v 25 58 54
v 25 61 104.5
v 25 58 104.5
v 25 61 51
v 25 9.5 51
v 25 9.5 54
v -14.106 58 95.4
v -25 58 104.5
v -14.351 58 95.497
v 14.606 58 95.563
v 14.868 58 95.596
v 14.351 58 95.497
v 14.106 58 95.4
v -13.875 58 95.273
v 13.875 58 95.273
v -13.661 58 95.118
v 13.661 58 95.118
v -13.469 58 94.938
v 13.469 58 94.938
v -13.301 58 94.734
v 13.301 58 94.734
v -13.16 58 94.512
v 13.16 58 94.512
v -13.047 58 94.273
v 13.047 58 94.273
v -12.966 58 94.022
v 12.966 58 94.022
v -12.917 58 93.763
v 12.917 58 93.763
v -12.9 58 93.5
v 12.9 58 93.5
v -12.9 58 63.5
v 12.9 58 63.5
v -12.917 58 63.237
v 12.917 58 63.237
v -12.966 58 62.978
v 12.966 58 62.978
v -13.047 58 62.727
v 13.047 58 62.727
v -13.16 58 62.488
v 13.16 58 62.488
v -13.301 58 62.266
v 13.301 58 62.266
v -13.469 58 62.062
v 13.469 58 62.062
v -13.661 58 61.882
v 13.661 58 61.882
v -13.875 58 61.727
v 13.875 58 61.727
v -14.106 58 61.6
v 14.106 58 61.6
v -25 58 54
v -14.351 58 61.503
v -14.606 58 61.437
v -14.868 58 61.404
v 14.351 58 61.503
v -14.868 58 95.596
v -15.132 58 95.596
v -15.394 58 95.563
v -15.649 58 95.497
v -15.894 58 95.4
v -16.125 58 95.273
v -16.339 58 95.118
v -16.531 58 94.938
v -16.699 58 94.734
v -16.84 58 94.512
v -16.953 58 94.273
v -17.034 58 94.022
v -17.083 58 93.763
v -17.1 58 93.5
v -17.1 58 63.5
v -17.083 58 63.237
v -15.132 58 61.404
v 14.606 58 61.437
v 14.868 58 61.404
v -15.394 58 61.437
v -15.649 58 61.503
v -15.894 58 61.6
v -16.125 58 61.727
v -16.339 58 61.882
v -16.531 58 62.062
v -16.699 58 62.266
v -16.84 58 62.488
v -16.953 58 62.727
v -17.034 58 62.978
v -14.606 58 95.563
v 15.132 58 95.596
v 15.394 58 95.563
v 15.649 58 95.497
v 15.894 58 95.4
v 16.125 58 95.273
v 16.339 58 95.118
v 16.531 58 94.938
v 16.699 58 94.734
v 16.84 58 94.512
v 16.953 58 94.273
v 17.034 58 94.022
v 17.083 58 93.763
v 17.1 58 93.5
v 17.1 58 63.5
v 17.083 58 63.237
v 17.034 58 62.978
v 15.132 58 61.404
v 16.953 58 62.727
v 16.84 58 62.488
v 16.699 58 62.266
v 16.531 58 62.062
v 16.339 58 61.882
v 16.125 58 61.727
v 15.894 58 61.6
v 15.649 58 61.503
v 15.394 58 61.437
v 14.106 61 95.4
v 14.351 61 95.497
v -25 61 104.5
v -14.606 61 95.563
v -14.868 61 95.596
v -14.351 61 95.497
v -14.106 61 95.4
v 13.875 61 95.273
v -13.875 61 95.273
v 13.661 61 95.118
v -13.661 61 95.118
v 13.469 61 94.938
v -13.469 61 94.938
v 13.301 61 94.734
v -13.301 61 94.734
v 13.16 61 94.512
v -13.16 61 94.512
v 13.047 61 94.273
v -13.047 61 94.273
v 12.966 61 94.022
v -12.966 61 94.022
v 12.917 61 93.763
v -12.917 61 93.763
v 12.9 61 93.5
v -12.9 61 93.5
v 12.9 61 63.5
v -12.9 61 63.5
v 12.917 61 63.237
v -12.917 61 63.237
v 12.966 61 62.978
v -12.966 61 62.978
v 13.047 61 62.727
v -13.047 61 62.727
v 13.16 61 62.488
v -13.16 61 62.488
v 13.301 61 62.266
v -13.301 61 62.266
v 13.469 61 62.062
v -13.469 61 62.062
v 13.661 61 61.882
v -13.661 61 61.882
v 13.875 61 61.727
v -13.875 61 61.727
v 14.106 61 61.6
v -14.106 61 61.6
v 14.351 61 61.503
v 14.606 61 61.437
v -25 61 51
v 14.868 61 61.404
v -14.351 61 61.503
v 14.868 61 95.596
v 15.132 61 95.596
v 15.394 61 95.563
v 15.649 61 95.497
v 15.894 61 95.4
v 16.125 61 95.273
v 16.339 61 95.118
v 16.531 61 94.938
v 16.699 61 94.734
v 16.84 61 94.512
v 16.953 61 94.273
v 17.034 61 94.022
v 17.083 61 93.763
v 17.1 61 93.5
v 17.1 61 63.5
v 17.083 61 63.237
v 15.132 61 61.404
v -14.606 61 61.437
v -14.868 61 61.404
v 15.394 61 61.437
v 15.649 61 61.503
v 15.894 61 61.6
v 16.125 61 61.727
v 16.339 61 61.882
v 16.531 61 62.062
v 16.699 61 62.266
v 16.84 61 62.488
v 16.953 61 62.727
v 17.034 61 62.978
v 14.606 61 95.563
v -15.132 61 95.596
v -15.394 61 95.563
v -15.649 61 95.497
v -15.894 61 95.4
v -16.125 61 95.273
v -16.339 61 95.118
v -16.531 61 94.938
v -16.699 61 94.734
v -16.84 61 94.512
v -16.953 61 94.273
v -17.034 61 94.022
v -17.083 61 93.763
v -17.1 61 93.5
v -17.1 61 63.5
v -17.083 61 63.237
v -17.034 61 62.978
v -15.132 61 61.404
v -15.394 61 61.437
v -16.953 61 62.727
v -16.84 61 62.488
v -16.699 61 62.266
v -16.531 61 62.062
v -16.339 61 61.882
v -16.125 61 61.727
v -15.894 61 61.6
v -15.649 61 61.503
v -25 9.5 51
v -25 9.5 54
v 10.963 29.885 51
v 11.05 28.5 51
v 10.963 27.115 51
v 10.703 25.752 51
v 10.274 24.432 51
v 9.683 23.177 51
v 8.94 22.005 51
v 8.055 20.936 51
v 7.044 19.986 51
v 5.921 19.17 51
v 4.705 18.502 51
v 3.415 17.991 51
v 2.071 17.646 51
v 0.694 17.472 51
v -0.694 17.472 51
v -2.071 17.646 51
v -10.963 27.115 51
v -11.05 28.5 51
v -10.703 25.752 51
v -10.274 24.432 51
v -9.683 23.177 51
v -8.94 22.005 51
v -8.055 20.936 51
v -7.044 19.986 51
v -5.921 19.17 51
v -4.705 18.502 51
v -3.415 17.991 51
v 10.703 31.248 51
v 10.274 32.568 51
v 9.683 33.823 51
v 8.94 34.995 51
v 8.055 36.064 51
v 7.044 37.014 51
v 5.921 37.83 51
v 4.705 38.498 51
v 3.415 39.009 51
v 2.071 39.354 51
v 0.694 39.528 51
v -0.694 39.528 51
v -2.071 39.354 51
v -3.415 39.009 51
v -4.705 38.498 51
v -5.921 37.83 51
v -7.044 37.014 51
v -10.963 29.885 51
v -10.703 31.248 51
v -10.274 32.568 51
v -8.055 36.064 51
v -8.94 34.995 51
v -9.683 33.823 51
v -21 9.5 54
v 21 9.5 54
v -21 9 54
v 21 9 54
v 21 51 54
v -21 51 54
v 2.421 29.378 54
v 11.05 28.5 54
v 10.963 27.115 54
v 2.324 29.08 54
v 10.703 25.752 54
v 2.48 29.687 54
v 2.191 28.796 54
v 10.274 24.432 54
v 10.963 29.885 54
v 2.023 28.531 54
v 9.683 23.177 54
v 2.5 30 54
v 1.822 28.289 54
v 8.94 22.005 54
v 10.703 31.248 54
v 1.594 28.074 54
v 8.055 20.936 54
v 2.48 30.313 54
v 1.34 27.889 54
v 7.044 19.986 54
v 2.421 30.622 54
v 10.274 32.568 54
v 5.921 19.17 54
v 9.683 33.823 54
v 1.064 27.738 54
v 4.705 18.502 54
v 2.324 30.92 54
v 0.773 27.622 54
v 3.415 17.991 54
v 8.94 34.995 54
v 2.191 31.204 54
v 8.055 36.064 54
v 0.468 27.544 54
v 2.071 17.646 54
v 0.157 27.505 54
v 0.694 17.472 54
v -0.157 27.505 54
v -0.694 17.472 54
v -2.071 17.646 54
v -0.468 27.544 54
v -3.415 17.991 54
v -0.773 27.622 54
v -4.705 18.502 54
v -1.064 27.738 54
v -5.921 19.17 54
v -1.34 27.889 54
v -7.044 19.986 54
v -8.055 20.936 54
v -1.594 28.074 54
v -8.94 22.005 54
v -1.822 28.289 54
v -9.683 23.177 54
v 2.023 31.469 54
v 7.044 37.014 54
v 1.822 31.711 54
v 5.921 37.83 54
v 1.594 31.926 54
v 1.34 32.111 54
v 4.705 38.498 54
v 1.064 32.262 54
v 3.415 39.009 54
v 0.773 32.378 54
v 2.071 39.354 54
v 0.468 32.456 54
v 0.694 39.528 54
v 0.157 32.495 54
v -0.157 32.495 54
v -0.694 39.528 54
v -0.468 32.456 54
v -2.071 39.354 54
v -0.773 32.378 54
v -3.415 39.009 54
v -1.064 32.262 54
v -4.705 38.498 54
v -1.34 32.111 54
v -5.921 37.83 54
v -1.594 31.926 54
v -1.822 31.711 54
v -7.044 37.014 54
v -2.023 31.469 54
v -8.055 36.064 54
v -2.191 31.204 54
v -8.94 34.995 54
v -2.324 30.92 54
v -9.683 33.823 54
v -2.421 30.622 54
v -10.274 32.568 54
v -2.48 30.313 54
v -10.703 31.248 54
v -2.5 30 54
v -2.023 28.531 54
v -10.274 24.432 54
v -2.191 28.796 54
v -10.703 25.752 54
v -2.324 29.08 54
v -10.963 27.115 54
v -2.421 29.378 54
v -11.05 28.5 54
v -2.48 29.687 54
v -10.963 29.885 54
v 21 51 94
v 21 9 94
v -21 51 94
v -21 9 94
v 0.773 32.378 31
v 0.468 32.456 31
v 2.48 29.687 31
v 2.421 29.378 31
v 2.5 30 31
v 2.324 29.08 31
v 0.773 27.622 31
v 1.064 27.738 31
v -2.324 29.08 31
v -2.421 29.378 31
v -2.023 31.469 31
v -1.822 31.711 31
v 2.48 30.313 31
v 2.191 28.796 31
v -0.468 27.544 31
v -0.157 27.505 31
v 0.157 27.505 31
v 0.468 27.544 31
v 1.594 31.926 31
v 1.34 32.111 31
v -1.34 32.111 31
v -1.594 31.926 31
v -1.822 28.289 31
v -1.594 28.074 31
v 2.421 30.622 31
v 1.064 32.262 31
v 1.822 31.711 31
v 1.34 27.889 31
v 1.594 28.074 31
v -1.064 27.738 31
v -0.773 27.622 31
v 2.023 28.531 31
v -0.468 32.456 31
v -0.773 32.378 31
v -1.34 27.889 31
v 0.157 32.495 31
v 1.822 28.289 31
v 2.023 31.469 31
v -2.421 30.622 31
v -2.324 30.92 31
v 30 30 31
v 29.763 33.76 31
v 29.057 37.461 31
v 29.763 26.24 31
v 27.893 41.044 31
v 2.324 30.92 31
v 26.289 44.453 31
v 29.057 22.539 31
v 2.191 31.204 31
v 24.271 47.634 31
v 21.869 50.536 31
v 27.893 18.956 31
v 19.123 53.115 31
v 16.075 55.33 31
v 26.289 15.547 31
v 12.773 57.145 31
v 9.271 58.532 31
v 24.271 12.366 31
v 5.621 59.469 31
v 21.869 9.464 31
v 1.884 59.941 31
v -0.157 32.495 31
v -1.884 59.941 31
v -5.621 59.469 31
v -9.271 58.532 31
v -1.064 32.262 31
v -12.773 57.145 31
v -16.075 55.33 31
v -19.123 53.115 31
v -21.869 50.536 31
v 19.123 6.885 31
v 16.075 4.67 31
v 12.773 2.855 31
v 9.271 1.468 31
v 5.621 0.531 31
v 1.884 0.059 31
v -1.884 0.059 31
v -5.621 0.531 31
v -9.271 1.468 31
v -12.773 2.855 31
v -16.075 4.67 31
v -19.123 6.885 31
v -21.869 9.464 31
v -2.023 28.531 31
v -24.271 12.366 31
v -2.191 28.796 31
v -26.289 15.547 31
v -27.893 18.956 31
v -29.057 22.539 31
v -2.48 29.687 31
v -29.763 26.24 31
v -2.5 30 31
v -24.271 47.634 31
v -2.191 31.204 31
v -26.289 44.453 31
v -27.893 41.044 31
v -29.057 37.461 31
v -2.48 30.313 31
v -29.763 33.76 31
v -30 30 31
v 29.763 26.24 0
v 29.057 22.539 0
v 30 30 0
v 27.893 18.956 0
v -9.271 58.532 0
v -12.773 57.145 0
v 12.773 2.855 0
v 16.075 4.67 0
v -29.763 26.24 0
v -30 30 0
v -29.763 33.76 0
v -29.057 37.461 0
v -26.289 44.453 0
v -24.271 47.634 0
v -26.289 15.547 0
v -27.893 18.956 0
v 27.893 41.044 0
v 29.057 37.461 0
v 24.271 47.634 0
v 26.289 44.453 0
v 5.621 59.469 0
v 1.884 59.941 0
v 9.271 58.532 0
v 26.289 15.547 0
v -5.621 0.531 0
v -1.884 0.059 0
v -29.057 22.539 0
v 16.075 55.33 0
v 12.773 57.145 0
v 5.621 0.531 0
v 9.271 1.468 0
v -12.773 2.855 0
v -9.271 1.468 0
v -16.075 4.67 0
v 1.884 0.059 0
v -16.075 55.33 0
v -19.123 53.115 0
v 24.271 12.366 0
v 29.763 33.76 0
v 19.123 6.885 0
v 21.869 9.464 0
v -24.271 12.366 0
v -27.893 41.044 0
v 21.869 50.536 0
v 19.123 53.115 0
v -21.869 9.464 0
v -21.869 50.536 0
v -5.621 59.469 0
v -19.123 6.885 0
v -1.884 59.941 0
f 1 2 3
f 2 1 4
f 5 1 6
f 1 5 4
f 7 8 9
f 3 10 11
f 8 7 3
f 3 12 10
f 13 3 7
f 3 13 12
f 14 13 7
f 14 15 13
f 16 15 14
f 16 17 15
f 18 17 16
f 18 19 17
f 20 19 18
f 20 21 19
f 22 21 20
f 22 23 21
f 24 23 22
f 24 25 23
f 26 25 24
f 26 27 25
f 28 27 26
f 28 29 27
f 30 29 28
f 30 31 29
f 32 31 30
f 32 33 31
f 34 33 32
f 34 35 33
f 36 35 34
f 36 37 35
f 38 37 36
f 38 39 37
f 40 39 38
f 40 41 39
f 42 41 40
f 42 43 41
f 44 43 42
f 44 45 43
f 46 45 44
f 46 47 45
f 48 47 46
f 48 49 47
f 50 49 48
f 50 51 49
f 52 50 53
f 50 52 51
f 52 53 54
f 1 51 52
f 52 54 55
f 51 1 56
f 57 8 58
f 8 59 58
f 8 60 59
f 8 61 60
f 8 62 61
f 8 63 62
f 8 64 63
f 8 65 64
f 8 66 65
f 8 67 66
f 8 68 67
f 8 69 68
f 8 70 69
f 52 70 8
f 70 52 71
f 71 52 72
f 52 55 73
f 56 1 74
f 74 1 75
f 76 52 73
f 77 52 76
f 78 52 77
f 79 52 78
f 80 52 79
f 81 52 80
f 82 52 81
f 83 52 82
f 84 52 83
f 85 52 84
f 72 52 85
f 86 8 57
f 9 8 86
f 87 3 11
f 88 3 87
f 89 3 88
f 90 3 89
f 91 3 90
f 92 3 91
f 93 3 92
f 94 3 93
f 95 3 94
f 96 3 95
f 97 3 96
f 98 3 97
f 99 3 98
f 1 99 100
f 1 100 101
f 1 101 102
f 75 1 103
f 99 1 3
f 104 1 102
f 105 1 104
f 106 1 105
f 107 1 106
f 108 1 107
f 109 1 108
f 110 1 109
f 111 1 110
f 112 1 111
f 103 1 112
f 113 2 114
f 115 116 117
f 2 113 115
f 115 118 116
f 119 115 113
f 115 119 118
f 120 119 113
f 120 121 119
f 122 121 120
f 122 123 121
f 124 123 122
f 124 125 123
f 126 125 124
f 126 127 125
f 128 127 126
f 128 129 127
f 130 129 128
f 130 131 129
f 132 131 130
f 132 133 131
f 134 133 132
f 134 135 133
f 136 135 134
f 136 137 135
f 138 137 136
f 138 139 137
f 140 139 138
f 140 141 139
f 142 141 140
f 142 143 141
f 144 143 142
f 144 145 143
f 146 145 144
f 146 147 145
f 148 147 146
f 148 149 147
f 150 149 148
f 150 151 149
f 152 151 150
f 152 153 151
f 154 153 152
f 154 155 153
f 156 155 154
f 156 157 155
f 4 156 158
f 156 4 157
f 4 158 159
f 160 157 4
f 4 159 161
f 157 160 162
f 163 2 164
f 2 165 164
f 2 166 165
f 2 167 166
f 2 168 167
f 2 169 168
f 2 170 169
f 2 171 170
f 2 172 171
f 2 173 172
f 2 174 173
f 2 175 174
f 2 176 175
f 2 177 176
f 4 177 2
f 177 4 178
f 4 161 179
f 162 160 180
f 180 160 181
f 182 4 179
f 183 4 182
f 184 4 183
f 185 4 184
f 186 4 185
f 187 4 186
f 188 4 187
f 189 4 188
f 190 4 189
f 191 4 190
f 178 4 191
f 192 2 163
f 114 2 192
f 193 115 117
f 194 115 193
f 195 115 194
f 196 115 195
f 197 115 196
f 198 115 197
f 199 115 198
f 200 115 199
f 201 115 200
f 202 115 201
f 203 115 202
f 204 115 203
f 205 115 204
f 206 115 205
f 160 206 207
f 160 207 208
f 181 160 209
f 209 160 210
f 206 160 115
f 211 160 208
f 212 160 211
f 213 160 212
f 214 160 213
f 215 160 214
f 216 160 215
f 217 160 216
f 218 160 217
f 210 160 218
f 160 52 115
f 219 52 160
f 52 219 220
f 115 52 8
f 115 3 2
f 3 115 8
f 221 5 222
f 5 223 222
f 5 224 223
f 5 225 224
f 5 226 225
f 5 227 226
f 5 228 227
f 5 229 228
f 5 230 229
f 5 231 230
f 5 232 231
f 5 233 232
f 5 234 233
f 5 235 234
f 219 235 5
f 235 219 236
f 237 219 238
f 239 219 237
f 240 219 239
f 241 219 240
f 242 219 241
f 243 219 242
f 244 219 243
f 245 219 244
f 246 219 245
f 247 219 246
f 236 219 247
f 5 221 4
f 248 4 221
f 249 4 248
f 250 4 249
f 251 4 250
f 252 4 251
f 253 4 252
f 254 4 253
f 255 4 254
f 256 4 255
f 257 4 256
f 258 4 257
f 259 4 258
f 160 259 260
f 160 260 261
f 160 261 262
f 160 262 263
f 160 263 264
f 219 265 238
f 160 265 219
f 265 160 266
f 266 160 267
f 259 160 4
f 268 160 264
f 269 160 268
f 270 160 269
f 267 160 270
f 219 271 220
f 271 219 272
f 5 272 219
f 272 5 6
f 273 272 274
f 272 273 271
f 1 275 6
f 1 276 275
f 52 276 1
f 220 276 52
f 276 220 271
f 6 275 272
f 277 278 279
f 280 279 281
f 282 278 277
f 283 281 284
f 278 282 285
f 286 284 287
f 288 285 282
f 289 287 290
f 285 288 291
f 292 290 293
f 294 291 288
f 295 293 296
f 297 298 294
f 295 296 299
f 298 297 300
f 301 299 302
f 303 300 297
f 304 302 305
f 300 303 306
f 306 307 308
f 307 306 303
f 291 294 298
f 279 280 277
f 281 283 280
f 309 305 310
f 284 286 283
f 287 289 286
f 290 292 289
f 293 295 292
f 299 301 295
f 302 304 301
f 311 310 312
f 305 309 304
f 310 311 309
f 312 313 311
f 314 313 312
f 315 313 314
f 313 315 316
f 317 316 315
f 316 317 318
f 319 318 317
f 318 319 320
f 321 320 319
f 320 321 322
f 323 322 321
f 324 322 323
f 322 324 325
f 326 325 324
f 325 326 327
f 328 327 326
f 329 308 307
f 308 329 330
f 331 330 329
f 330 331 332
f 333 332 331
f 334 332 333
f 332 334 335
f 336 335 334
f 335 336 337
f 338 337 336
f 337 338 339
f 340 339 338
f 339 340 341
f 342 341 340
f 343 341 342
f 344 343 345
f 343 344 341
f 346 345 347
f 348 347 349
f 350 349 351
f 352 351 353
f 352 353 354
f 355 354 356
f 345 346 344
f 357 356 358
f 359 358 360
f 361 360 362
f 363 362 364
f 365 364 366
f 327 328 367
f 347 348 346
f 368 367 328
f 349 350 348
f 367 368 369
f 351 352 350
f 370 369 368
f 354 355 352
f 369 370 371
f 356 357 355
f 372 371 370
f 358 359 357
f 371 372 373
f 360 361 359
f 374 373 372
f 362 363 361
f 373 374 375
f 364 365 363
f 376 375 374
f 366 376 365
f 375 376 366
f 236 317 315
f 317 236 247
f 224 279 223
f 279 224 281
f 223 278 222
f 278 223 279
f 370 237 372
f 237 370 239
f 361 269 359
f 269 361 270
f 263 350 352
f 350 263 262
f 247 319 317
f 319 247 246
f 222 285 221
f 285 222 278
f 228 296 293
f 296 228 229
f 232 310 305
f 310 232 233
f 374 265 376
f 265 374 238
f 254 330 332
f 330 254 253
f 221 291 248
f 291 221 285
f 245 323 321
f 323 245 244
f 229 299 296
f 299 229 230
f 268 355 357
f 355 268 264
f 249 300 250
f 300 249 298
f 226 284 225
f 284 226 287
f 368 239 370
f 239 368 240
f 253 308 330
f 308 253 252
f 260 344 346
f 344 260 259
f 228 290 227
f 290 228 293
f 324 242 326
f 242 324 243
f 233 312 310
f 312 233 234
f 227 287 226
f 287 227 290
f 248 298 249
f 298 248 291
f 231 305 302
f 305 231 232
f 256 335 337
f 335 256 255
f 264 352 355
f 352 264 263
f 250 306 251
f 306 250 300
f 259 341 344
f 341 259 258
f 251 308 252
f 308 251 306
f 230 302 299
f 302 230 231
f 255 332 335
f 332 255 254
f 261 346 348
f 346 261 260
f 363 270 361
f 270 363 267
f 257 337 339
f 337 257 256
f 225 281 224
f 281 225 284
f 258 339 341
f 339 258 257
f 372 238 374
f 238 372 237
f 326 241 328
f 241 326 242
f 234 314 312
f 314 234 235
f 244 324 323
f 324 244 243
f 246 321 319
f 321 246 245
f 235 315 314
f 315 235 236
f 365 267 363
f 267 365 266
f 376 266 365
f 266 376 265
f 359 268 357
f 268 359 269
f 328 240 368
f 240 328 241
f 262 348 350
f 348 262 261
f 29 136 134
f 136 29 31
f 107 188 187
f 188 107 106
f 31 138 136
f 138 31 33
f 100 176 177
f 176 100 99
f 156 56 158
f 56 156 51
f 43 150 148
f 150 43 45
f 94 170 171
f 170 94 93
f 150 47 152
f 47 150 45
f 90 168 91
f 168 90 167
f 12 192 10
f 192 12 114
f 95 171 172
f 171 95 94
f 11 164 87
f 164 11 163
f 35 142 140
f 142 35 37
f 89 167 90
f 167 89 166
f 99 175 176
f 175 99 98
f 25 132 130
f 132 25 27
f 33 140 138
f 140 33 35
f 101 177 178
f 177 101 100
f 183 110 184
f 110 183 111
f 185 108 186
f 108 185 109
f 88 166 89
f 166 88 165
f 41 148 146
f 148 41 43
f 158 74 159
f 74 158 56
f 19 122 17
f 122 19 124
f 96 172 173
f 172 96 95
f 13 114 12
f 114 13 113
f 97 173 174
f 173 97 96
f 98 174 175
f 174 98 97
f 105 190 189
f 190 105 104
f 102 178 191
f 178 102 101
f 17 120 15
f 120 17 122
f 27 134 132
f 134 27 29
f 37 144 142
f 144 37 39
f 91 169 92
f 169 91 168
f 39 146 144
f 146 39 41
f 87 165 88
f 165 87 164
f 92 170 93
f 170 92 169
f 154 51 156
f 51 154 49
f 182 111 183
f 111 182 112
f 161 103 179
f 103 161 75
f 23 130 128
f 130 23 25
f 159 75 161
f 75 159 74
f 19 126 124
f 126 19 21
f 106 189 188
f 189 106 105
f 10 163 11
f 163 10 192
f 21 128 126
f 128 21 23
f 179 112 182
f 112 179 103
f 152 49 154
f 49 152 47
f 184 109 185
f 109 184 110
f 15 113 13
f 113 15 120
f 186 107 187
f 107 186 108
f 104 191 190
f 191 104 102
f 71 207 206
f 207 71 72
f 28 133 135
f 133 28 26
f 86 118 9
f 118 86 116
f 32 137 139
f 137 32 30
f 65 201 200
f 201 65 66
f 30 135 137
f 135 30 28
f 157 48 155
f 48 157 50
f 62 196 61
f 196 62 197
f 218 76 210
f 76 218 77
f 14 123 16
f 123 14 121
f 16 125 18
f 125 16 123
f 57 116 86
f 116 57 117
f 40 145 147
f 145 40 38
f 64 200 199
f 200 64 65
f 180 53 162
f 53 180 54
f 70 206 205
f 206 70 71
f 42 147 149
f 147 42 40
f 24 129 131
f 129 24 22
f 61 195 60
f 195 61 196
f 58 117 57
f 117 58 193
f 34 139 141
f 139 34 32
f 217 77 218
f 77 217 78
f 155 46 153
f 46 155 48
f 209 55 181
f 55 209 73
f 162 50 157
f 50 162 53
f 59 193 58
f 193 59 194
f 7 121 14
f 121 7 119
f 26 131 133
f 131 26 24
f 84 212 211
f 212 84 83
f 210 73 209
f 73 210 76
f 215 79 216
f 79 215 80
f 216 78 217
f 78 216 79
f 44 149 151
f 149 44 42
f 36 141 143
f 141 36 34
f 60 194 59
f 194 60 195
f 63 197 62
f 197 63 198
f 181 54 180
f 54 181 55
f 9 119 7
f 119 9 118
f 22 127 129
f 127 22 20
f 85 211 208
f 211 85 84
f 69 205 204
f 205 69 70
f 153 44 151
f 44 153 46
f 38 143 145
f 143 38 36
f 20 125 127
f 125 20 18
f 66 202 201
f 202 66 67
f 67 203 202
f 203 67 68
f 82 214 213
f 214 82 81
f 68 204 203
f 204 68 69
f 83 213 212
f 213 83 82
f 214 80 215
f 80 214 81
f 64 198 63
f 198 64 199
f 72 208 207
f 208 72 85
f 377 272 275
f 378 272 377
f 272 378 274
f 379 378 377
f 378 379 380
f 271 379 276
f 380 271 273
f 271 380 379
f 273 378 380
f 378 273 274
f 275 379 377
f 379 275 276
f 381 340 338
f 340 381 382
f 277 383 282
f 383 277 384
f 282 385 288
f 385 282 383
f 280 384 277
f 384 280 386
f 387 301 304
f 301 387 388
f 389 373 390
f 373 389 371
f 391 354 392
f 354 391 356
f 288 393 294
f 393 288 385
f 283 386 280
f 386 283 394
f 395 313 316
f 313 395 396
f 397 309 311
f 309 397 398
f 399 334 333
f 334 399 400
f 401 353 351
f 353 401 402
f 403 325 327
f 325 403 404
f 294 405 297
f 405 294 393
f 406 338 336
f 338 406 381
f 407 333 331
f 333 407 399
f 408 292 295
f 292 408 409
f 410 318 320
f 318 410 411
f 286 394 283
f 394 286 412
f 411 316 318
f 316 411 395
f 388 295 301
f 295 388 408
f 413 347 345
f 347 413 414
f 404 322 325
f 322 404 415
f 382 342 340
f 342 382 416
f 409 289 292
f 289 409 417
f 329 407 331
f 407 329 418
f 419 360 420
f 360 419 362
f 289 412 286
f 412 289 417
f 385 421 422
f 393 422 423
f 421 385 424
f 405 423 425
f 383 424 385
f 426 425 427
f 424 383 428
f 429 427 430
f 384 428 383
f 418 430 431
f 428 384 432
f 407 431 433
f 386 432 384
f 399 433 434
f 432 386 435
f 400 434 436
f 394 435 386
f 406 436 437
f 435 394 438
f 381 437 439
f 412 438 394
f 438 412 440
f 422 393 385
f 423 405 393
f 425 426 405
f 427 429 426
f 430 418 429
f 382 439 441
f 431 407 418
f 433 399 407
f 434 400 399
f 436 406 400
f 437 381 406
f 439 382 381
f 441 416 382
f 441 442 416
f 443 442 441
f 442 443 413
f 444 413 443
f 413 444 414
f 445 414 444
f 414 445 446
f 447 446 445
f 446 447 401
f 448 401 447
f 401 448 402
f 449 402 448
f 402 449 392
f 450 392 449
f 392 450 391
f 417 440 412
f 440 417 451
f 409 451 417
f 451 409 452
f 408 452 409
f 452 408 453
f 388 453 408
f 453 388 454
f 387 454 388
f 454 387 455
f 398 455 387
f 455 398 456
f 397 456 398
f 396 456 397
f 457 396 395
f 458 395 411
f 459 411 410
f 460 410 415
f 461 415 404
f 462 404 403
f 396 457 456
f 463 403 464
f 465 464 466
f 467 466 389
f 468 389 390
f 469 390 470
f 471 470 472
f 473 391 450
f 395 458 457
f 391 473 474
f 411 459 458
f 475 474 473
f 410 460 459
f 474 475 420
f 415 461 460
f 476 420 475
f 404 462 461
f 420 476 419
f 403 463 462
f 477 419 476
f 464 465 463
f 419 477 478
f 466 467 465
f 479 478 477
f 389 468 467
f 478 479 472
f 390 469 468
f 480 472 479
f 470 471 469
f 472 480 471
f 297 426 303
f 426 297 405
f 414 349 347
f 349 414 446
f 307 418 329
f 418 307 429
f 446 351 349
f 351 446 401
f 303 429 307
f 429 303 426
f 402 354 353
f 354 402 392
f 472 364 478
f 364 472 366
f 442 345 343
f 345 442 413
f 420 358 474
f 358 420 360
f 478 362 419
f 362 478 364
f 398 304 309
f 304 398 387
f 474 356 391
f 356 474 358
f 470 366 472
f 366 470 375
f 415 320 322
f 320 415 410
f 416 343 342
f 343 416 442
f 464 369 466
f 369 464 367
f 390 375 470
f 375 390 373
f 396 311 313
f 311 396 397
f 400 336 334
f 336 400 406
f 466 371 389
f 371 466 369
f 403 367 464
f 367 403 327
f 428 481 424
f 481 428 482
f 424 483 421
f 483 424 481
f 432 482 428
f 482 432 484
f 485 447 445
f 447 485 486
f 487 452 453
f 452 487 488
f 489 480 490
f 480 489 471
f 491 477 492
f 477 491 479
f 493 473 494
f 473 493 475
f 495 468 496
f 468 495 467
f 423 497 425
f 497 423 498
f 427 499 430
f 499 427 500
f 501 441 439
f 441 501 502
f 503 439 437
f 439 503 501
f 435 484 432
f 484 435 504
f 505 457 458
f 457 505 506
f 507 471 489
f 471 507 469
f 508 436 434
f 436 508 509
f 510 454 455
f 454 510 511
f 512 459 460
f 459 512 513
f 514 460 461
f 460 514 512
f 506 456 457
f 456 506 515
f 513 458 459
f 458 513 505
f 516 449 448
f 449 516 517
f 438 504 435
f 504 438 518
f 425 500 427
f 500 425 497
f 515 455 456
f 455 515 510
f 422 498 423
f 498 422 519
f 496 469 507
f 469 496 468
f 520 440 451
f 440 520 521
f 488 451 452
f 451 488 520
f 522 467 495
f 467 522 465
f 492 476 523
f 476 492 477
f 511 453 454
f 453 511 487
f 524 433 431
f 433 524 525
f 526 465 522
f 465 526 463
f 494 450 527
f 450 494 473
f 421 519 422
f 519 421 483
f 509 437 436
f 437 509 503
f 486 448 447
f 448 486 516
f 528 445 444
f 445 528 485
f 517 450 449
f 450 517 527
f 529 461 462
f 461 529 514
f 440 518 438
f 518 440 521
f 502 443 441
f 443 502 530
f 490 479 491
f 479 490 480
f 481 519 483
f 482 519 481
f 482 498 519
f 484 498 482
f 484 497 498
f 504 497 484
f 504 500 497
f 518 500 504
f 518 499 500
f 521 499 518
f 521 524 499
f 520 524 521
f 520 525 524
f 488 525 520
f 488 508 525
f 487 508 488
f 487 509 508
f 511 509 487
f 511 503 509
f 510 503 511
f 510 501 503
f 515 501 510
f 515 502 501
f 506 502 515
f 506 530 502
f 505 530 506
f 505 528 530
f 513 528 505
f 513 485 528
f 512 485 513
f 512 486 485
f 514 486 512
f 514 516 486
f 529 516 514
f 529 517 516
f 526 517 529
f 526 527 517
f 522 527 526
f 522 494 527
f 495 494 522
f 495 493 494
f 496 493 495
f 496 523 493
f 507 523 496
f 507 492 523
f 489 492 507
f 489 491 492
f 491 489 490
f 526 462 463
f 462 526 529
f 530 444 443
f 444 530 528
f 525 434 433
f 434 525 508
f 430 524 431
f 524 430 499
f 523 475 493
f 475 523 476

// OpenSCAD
// file: calcs.scad
include <inputs.scad>

// CALCS (everything ends up in [mm])
robot_height = robot_height_in*cu-height_edge*cu*2; // height of the robot
robot_width = robot_width_in*cu-side_edge*cu*2; // width of the robot

base_bottom = base_clearance*cu; // height of the bottom of the base
base_top = base_bottom + base_thickness; // height of the top of the base

storage_size = storage_width*cu; // inside depth of storage area
storage_height = robot_height-base_top; // height of storage container
wire_hole = wire_hole_in*cu; // diameter of hole for wires under storage area

dump_height = dump_height_in*cu; // height that platform edge will raise to dump

shaft_width = robot_width - 2*storage_size - 2*thickness; // inside width of elevator shaft


cut_size = (robot_height-dump_height-base_top)/2+tol; // size of vertical cut for sliding together

shift = shaft_width/2 + thickness/2; // how much the pieces need to be shifted to be put together


wheel_opening_width = wheel_d; // width of opening for wheels on sub base
wheel_opening_depth = wheel_w + wheel_opening_depth_tol; // width of opening for wheels on sub base

drive_height = max(mount_motor_hole_offset,wheel_d/2) + max(mount_motor_hole_offset-mount_motor_hole_offset,wheel_d/2); // height of wheel, motor, and mount

sbase_top_height = drive_height + sbase_thickness; // height of the top of the sub base


false_bottom_height = false_bottom_height_in*cu; // height of false bottom in front

false_opening_height = false_opening_height_in*cu; // height of hole for false bottom


cut_height = base_bottom + false_opening_height - base_thickness; // height at which cuts will meet

bottom_cut_height = cut_height - base_top + tol; // height of bottom cut

top_cut_height = robot_height - dump_height - cut_height + tol; // height of top cut

el_step_height = el_step_height_in*cu; // height of steppers for elevator

// Checking
if (shaft_width < storage_size)
{
    echo("<b>THE STORAGE AREAS WILL BE TOO NARROW!!!!!!!!!!!!!!!!!!!!!!!!!!");
    echo("THIS IS A PROBLEM!!!!!!!!!!!!!!!!!!!!!!!!!!");
    echo("Width: ", shaft_width/cu, "[in]");
}
else
{
    echo("<b>Storage width will be:", shaft_width/cu, "[in]</b>");
}

echo("<b>Corner Size:", (robot_width-shaft_width-2*thickness)/2/cu, "[in]</b>");

// error check for sbase and base
if (sbase_top_height >= base_bottom)
{
    echo("<b>SUB BASE TOO TALL!!!!!!!!!!!!!!!!!!!!!!!!!!</b>");
}
else
{
    echo("<b>Spacer height should be:", (base_bottom - sbase_top_height)/cu, "[in]</b>");
}


echo(shaft_width/cu);
echo(storage_size/cu);
// file: inputs.scad
$fn = 50;
cu = 25.4; // inch -> mm

// INPUTS
thickness = 2; // thickness of the acrylic [mm]
base_thickness = 5; // thickness of the base acrylic [mm]

side_edge = 0.25; // clearance for each side of the robot [in]
height_edge = 0.1; // clearance for top and bottom of the robot [in]

robot_height_in = 11; // overall height of the robot [in]
robot_width_in = 9; // overall width of the robot [in]

base_clearance = 2.65; // clearance of the base to ground [in]

storage_width = 2.65; // inside width of storage container [in]

block_width = 5; // width of jigsaw block [mm]

dump_height_in = 1.75; // height that platform edge will raise to dump [in]

tol = 0.001; // number used to fix rounding? [mm]


sbase_thickness = 0; // thickness of the sub base [mm]

wheel_opening_depth_tol = 5; // extra space for wheel depth [mm]

hole_dist_opposing = 33.98; // distance between middles of opposing mounting holes [mm]

hole_dist_adjacent = 6.36; // distance between middles of adjacent mounting holes [mm]

hole_diameter = 3.26; // diameter of mounting holes [mm]

hole_in_spacing = 5; // distance from edge to middle of first mount holes [mm]


servo_length = 41; // lenght of servo [mm]

servo_width = 21; // width of servo [mm]

servo_depth = 37; // height of servo to top plate [mm]

servo_mount_length = 7; // length of servo hole mount (one side) [mm]

servo_wire_clear_length = 12; // length wires protrude from side [mm]

servo_circle_d = 14.5; // diameter of circular protrusion around spline [mm]

servo_circle_offset = 10; // distance from one side to center of spline [mm]


stepper_depth = 40; // depth of stepper [mm]

stepper_lw = 42; // length/width of stepper [mm]

stepper_shaft_ext = 23; // extension of stepper shaft from face [mm]

s_shaft_d = 5; // stepper shaft diameter [mm]

mount_width = 50; // width of motor mount [mm]

mount_mount_hole_offset_w = 15; // distance from center to mount holes for motor mount [mm]

mount_mount_hole_offset_from_back = 11; // distance from back to first mount holes for motor mount [mm]

mount_mount_hole_differential = 30; // distance from first mount hole to second mount hole for motor mount [mm]

mount_mount_hole_d = 4.2; // diameter of mount mount hole[mm]

mount_motor_hole_offset = 31; // distance from top of mount to center of motor hole [mm]

mount_motor_hole_d = 22.1; // diameter of motor hole in mount [mm]

mount_length = 53.5; // length of motor mount [mm]

mount_depth = 51.5; // depth of motor mount [mm]

mount_thickness = 3; // thickness of metal for mount [mm]

wheel_d = 60; // diameter of wheel [mm]

wheel_w = 31; // width of wheel [mm]

wheel_out = 17; // how far out the shaft the wheel starts [mm]

wedge_tol = 1; // tolerance for edges of wedge [mm]

wedge_angle = 30; // angle of wedge from horizontal [deg]

wedge_thickness = 5; // thickness of wedge [mm]


wire_hole_in = 0.5; // size of hole for wires to motors

wire_tri_edge = 5; // thickness of edge on wiring triangle [mm]

false_bottom_height_in = 3; // height of false bottom in front [in]

bottom_clearance = 3; // clearance for walls on bottom of robot [mm]

false_opening_height_in = 3; // height of hole for false bottom [in]


el_step_height_in = 2; // height of steppers for elevator [in]

el_motor_size = 35; // length of elevator stepper motor [mm]

bracket_thickness = 3; // thickness of bracket for elevator stepper [mm]
// main file
include <inputs.scad>
include <calcs.scad>

module stepper()
{
    cube(size = [stepper_lw, stepper_lw, stepper_depth], center = true);
    translate(v = [0,0,stepper_depth/2])
        cylinder(h = stepper_shaft_ext, d = s_shaft_d, center = false);
}

module bracket_base()
{
    difference()
    {
        union()
        {
            cube(size = [mount_width, mount_length, mount_thickness], center = true);
            translate(v = [0, -mount_length/2+mount_thickness/2, mount_depth/2-mount_thickness/2])
                cube(size = [mount_width, mount_thickness, mount_depth], center = true);
        }
        
        rotate(a = 90, v = [1, 0, 0])
        translate(v = [0, mount_motor_hole_offset, 0])
        cylinder(h = mount_length, d = mount_motor_hole_d, center = false);
    }
}

module bracket_holes()
{
    hull() {
            translate(v = [mount_mount_hole_offset_w, mount_length/2-mount_mount_hole_offset_from_back, 0])
                #cylinder(h = 5*mount_thickness, d = mount_mount_hole_d, center = true);
            translate(v = [mount_mount_hole_offset_w, mount_length/2-mount_mount_hole_offset_from_back-mount_mount_hole_differential, 0])
            #cylinder(h = 5*mount_thickness, d = mount_mount_hole_d, center = true);
        }
        
        hull() {
            translate(v = [-mount_mount_hole_offset_w, mount_length/2-mount_mount_hole_offset_from_back, 0])
                #cylinder(h = 5*mount_thickness, d = mount_mount_hole_d, center = true);
            translate(v = [-mount_mount_hole_offset_w, mount_length/2-mount_mount_hole_offset_from_back-mount_mount_hole_differential, 0])
            #cylinder(h = 5*mount_thickness, d = mount_mount_hole_d, center = true);
        }
}

module bracket()
{
    translate(v = [0, mount_length/2, mount_thickness/2])
    difference()
    {
        bracket_base();
        bracket_holes();
    }
}

module wheel()
{
    rotate(a = 90, v = [1, 0, 0])
        cylinder(h = wheel_w, d = wheel_d, center = false);
}

*stepper();
*bracket();
*wheel();

module drive()
{
    rotate(a = 90, v = [1, 0, 0])
    translate(v = [0, wheel_w+wheel_out+mount_thickness, mount_motor_hole_offset - drive_height])
    {
        translate(v = [0, 0, -mount_motor_hole_offset])
        {
            bracket();
            translate(v = [0, stepper_depth/2+mount_thickness, mount_motor_hole_offset])
                rotate(a = 90, v = [1, 0, 0])
                    stepper();
        }
        translate(v = [0, -wheel_out-mount_thickness, 0])
            wheel();
    }
}


drive();
